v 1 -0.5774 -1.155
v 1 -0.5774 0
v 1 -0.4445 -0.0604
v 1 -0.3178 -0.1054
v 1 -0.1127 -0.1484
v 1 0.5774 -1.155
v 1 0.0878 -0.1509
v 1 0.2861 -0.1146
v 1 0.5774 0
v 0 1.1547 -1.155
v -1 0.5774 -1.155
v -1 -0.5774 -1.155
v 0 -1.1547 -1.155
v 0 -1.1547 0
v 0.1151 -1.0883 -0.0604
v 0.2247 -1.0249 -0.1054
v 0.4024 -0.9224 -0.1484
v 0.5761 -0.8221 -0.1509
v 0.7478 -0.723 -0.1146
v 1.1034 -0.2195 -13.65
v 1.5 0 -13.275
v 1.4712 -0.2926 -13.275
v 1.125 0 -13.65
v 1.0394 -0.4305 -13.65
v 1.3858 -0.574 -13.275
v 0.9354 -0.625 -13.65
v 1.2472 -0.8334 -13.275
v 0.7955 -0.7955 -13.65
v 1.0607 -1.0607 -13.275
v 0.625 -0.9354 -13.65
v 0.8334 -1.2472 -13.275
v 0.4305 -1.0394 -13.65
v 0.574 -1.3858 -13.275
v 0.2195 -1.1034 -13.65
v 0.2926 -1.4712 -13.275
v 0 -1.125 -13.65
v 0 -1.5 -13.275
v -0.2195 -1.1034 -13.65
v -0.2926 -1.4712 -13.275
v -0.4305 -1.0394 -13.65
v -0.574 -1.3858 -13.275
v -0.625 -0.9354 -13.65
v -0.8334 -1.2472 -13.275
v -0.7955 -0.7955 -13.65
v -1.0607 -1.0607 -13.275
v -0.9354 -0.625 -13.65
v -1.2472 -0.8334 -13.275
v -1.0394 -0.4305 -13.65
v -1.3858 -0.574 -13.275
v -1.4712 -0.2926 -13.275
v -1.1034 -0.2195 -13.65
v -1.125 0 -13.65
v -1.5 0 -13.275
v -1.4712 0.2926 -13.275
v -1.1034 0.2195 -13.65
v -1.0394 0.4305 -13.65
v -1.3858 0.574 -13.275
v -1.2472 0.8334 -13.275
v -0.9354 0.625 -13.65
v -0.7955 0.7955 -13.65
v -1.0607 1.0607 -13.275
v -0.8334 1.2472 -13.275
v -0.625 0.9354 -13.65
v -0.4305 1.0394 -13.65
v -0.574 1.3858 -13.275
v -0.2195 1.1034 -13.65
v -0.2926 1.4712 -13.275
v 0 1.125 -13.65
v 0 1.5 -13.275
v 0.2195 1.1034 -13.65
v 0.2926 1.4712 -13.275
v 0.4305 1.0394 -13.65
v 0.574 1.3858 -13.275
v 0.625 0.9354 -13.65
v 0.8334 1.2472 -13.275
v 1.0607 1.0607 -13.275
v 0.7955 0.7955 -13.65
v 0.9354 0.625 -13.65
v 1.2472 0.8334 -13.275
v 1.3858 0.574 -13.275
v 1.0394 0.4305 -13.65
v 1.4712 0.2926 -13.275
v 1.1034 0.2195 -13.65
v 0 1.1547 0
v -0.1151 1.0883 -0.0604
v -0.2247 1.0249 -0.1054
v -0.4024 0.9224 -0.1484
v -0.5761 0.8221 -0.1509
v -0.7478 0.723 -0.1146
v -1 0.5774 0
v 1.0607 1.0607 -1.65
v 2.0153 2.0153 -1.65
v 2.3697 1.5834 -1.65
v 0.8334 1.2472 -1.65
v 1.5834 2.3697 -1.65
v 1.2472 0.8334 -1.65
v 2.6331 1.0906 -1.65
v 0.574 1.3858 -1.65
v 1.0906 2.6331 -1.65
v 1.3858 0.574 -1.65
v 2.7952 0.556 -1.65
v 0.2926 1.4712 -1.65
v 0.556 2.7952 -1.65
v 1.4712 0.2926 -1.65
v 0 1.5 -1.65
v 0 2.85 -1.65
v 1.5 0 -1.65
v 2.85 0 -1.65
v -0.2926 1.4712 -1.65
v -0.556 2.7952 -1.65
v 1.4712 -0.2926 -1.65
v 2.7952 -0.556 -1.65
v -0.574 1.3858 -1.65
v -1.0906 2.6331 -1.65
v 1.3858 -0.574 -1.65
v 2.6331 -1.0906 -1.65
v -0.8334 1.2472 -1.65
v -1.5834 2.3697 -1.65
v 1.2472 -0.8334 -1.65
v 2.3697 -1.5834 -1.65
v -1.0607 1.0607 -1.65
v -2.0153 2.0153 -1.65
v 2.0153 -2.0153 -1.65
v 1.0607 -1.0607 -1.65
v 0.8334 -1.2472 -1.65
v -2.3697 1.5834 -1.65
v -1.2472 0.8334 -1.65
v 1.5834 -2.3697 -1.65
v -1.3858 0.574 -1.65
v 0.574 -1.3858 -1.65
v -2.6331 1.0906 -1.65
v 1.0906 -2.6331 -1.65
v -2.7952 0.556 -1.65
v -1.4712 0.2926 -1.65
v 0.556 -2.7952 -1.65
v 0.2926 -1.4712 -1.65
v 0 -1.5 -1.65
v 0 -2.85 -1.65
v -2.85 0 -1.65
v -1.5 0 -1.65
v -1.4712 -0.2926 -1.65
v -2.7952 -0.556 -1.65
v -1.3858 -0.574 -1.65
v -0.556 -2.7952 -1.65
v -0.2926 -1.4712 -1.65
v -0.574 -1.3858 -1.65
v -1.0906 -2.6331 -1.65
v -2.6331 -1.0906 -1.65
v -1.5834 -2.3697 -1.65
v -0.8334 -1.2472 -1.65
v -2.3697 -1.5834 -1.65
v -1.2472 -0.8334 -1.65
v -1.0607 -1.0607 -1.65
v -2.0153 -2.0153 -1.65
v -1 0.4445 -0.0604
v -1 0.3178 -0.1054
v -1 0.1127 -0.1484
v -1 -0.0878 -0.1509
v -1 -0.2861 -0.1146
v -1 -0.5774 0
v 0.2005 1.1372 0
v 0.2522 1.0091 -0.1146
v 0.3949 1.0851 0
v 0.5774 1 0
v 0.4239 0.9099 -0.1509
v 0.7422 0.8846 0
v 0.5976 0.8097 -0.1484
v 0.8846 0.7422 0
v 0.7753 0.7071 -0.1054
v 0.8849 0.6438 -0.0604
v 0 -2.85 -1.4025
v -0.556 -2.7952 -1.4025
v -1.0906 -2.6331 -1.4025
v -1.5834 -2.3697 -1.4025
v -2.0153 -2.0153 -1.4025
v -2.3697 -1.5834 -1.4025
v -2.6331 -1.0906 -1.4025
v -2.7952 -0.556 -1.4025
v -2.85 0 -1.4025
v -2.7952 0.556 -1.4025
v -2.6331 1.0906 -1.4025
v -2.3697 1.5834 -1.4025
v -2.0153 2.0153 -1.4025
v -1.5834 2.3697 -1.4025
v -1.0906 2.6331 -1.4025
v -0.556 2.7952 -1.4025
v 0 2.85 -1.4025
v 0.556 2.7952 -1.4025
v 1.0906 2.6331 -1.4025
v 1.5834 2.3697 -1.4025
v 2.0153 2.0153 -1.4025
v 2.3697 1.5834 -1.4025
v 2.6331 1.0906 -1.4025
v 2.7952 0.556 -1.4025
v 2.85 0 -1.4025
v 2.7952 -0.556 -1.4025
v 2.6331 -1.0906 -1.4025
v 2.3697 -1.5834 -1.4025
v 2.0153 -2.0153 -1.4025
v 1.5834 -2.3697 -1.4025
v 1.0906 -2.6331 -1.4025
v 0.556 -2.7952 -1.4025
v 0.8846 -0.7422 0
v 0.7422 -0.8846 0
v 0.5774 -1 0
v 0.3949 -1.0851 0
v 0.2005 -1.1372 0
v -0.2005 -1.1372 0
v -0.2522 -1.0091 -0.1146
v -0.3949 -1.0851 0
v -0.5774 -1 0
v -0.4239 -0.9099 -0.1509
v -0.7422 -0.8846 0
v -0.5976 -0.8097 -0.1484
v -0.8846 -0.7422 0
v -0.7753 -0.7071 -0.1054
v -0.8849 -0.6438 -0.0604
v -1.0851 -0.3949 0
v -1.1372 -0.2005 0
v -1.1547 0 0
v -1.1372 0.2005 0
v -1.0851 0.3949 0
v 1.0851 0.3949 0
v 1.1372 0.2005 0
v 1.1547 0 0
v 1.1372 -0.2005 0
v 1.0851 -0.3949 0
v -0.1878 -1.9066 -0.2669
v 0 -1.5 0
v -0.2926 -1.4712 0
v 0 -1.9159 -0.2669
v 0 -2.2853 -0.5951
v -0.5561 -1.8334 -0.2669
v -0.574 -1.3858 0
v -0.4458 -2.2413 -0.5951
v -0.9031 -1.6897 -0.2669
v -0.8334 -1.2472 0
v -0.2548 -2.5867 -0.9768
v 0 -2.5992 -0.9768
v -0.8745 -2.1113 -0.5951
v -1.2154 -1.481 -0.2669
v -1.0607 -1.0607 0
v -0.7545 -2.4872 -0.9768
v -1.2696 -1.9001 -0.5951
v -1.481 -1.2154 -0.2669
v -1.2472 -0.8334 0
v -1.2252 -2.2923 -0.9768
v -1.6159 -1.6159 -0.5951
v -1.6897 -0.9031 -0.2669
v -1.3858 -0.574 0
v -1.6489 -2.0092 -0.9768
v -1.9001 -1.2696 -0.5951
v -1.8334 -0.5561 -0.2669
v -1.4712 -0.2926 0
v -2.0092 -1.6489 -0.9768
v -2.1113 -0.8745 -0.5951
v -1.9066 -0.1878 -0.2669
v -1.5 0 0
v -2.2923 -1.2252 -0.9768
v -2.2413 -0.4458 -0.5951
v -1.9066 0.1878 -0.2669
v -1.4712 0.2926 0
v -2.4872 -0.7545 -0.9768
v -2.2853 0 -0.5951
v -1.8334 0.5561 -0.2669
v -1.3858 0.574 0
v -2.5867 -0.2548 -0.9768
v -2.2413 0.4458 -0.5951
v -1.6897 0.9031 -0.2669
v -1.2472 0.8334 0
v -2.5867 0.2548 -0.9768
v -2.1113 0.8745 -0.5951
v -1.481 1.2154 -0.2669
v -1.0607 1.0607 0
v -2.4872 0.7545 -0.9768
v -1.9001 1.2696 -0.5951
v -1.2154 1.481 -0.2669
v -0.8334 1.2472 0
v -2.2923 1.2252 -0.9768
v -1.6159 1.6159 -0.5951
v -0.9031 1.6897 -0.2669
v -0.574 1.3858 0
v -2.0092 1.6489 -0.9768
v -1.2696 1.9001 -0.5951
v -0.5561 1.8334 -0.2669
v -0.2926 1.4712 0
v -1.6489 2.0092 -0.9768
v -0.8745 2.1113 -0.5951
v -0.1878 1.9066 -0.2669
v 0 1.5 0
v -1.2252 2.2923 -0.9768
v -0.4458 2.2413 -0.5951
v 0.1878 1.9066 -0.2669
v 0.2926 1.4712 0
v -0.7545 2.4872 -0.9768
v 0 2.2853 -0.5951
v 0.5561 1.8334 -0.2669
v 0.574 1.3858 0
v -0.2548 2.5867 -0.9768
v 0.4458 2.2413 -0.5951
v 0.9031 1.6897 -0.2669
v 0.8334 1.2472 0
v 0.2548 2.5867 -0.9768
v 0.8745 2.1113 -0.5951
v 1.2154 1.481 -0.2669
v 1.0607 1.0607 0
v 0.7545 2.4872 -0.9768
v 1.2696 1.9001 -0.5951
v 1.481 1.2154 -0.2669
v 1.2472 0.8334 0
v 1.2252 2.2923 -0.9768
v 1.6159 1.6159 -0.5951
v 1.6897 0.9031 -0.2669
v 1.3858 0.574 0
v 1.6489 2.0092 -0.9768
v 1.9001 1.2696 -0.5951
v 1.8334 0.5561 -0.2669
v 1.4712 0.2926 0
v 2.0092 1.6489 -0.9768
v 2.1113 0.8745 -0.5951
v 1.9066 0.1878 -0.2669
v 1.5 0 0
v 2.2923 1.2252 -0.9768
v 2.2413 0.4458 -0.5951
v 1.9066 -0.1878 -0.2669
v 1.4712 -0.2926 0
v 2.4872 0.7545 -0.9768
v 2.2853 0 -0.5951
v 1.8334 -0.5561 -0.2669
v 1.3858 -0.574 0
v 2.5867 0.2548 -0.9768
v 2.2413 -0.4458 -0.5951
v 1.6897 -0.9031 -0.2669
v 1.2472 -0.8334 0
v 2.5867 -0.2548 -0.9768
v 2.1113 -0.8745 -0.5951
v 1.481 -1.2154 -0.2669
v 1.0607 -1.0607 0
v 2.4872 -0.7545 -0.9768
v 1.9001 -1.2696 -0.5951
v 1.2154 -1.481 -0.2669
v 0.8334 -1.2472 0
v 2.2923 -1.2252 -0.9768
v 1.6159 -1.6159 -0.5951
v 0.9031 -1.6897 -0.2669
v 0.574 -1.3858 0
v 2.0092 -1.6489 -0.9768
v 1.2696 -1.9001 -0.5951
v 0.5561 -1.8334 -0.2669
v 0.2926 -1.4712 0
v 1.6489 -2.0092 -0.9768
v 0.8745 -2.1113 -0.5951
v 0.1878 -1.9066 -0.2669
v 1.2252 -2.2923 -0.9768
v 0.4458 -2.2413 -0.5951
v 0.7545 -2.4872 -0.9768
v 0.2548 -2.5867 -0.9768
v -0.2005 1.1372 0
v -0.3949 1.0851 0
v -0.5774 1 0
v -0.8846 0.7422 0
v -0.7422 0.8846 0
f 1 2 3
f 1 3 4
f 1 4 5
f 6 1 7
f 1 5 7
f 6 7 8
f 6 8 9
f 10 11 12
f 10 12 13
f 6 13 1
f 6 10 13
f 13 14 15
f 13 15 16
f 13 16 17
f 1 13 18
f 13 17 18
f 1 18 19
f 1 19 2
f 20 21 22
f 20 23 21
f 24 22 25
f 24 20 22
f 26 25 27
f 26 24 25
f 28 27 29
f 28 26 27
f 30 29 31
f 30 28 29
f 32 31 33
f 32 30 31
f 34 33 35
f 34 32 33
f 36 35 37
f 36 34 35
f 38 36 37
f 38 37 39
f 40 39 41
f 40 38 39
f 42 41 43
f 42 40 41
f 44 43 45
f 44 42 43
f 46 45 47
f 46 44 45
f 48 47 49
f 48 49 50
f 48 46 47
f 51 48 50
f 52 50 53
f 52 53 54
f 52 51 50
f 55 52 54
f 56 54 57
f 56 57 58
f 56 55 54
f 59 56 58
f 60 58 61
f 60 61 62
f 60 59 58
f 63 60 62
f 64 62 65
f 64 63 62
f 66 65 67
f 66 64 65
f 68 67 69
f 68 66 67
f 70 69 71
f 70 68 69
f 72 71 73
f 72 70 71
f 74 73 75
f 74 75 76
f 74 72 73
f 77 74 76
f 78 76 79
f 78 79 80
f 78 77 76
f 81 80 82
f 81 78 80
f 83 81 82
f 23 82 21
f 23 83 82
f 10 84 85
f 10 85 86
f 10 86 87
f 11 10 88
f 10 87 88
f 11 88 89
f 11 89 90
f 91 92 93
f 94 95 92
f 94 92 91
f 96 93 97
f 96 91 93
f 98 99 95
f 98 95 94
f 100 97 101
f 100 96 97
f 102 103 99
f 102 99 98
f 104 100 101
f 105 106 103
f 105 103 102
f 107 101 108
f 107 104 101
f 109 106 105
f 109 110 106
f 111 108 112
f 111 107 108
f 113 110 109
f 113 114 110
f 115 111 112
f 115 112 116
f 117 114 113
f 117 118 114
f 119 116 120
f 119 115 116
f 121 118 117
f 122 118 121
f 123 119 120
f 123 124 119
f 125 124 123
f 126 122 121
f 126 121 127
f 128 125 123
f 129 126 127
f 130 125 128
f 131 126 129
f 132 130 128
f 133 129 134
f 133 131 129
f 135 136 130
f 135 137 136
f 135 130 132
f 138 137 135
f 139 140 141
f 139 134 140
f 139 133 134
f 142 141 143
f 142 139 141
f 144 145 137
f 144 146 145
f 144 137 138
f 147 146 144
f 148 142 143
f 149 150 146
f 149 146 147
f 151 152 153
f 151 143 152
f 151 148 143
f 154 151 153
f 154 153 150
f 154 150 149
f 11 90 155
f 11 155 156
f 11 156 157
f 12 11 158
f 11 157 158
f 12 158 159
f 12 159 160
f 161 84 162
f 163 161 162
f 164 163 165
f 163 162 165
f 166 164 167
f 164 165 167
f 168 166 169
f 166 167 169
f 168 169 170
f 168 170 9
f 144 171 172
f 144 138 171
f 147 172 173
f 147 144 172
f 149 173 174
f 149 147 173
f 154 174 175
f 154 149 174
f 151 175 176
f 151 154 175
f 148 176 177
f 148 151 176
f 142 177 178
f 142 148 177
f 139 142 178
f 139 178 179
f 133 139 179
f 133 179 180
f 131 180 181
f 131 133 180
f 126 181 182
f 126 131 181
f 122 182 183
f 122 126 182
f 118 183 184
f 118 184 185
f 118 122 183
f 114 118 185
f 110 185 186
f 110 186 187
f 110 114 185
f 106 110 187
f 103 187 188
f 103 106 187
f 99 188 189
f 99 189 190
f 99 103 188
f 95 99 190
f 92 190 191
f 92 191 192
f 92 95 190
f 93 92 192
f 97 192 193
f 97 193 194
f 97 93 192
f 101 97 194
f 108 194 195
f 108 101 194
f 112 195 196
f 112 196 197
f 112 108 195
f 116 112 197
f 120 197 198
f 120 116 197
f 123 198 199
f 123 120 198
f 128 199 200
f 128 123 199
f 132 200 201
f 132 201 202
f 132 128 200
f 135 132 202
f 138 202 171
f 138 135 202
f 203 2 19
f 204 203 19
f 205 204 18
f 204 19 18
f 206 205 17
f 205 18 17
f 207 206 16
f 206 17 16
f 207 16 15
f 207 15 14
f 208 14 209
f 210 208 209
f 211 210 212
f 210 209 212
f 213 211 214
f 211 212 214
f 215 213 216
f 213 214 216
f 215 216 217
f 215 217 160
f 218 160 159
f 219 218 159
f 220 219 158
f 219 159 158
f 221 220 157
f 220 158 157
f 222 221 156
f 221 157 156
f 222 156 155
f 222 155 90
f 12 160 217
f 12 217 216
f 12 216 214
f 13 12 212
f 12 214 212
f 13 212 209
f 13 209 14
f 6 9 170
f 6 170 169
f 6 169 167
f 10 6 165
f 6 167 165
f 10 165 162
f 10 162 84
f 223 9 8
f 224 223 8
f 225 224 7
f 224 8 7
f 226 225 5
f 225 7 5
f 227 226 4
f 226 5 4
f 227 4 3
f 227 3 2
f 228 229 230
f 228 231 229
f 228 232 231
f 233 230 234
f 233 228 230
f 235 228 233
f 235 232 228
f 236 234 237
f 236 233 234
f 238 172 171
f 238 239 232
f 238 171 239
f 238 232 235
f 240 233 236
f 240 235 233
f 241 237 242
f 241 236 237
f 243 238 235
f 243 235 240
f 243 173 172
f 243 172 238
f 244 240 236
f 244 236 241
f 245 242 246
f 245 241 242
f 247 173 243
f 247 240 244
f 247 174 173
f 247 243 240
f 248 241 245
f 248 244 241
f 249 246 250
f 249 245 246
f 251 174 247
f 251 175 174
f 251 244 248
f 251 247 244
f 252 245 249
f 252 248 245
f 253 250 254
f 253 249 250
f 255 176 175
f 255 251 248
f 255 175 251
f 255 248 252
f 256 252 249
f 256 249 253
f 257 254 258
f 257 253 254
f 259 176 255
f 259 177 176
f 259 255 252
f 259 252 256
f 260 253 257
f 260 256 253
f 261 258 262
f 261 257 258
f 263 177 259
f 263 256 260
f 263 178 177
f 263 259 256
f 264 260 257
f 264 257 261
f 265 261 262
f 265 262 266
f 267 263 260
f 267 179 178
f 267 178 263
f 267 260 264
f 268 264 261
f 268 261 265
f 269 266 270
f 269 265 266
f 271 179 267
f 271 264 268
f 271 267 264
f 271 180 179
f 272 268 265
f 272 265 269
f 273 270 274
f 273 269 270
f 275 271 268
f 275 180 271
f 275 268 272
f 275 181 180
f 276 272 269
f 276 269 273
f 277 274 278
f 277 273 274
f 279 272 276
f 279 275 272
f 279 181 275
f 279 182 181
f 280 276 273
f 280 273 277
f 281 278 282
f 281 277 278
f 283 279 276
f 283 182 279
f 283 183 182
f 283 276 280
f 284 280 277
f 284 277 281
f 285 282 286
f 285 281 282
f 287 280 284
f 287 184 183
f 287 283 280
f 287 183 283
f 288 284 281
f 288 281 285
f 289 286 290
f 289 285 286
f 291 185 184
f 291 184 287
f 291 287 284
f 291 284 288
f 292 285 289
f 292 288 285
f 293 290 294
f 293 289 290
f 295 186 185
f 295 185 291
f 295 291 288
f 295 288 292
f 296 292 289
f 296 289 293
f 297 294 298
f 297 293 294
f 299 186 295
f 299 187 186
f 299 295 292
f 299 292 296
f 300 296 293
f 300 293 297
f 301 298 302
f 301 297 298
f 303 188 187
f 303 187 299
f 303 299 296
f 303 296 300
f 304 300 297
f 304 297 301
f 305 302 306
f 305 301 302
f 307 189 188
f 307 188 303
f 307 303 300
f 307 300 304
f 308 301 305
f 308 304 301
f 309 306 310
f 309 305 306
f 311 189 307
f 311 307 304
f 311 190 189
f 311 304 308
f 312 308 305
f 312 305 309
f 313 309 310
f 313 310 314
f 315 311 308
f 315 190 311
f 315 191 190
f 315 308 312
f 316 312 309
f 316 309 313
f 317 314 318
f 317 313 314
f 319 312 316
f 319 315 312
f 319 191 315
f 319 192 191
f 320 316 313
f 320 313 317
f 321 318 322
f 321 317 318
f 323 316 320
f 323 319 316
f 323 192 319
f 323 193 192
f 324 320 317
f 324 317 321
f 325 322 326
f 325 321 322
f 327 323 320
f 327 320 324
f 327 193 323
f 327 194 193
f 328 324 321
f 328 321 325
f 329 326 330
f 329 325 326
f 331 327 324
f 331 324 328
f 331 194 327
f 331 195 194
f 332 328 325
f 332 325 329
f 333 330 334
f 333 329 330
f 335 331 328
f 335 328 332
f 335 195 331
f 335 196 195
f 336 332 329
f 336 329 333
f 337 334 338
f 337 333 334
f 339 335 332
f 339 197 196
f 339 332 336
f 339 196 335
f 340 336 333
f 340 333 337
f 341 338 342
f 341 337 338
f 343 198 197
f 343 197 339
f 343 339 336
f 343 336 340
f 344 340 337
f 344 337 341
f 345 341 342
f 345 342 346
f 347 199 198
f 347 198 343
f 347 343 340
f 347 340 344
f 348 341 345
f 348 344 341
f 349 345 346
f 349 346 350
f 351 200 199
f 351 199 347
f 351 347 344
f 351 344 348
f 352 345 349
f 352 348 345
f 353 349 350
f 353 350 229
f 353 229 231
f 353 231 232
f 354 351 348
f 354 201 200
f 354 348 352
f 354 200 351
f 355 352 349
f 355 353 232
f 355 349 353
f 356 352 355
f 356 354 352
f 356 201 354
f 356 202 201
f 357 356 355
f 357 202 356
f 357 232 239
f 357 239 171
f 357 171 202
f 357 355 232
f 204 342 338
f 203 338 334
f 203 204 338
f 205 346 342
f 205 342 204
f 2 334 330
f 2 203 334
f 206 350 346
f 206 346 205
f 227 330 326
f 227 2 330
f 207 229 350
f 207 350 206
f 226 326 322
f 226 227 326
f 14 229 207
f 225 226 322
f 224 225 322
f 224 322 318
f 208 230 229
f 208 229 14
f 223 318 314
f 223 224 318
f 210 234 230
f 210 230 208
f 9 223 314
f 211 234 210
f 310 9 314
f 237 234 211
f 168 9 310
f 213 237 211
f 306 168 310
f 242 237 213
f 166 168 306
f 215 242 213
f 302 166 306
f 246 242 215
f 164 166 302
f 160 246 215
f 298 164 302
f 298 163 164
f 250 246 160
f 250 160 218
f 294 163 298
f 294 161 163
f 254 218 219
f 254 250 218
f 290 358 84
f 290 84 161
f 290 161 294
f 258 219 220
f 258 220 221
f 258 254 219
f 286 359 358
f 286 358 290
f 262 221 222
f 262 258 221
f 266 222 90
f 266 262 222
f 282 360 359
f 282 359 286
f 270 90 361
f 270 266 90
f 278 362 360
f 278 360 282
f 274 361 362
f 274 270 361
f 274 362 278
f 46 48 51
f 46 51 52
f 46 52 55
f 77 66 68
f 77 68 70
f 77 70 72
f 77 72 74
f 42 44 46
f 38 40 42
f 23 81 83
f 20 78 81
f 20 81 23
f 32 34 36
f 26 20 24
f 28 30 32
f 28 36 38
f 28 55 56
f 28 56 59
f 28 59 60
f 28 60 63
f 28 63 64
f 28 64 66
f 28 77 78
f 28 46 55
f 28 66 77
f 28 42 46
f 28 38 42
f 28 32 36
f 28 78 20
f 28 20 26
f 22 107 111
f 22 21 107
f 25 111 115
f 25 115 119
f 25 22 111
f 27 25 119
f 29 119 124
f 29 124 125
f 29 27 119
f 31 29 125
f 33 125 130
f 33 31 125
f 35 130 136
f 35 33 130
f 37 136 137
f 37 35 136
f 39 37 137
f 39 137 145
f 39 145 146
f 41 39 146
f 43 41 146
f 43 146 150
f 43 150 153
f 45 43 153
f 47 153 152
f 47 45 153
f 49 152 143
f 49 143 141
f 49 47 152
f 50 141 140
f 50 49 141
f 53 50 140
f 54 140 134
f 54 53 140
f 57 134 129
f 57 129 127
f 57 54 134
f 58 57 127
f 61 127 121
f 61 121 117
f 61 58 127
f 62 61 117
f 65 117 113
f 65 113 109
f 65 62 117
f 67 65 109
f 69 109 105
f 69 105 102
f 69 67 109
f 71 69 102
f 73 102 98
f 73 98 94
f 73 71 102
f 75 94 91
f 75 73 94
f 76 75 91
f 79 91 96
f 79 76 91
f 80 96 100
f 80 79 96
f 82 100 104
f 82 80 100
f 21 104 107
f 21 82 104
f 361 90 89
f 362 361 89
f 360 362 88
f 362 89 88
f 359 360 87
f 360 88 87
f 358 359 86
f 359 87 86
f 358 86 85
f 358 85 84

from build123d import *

# Parameters (mm, degrees)
CUT_EXTRUDE2_DEPTH = 1.155


with BuildPart() as part:
    # Sketch10 → Revolve3 (revolve)
    with BuildSketch(Plane(origin=(0, 0, 0), x_dir=(0, 0, -1), z_dir=(1, 0, 0)), mode=Mode.PRIVATE) as revolve3_sk:
        Polygon((13.275, 1.5), (13.65, 1.125), (13.65, 0), (1.65, 0), (1.65, 1.5), align=None)
    revolve(revolve3_sk.sketch.rotate(Axis((0, 0, 0), (0, 0, -1)), 90), axis=Axis((0, 0, 0), (0, 0, -1)))

    # Sketch7 → Revolve2 (revolve)
    with BuildSketch(Plane(origin=(0, 0, 0), x_dir=(0, 0, -1), z_dir=(1, 0, 0)), mode=Mode.PRIVATE) as revolve2_sk:
        with BuildLine():
            Line((1.4025, 2.85), (1.65, 2.85))
            Line((1.65, 2.85), (1.65, 0))
            Line((1.65, 0), (0, 0))
            Line((0, 0), (0, 1.5))
            ThreePointArc((0, 1.5), (0.59512511, 2.285251969), (1.4025, 2.85))
        make_face()
    revolve(revolve2_sk.sketch.rotate(Axis((0, 0, 0), (0, 0, -1)), 180), axis=Axis((0, 0, 0), (0, 0, -1)))

    # Sketch5 → Cut-Extrude2 (cut)
    with BuildSketch(Plane.XY):
        Polygon((1, -0.577350269), (1, 0.577350269), (0, 1.154700538), (-1, 0.577350269), (-1, -0.577350269), (0, -1.154700538), align=None)
    extrude(amount=-CUT_EXTRUDE2_DEPTH, mode=Mode.SUBTRACT)

    # Cut-Extrude3 cone 1 section (through the dimple's axis) → Cut-Extrude3 (revolve, cut)
    with BuildSketch(Plane(origin=(0, 0, 0), x_dir=(0, -1, 0), z_dir=(1, 0, 0))):
        Polygon((0, 0), (1.154700538, 0), (0, 1.154700538), align=None)
    revolve(axis=Axis((0, 0, 0), (0, 0, -1)), mode=Mode.SUBTRACT)


with BuildPart() as body_2:
    # Split1: read off the stored shape, not the designer's step
    # Split1: the piece on the far side of the plane
    add(part.part)
    split(bisect_by=Plane.XY.offset(-1.65), keep=Keep.BOTTOM)


with BuildPart() as part_1:
    add(part.part)

    # Split1
    split(bisect_by=Plane.XY.offset(-1.65), keep=Keep.TOP)


with BuildPart() as body_2_1:
    add(body_2.part)

    # Boss-Extrude1: read off the stored shape, not the designer's step
    # Boss-Extrude1: union part
    add(part_1.part)


solid = body_2_1.part
